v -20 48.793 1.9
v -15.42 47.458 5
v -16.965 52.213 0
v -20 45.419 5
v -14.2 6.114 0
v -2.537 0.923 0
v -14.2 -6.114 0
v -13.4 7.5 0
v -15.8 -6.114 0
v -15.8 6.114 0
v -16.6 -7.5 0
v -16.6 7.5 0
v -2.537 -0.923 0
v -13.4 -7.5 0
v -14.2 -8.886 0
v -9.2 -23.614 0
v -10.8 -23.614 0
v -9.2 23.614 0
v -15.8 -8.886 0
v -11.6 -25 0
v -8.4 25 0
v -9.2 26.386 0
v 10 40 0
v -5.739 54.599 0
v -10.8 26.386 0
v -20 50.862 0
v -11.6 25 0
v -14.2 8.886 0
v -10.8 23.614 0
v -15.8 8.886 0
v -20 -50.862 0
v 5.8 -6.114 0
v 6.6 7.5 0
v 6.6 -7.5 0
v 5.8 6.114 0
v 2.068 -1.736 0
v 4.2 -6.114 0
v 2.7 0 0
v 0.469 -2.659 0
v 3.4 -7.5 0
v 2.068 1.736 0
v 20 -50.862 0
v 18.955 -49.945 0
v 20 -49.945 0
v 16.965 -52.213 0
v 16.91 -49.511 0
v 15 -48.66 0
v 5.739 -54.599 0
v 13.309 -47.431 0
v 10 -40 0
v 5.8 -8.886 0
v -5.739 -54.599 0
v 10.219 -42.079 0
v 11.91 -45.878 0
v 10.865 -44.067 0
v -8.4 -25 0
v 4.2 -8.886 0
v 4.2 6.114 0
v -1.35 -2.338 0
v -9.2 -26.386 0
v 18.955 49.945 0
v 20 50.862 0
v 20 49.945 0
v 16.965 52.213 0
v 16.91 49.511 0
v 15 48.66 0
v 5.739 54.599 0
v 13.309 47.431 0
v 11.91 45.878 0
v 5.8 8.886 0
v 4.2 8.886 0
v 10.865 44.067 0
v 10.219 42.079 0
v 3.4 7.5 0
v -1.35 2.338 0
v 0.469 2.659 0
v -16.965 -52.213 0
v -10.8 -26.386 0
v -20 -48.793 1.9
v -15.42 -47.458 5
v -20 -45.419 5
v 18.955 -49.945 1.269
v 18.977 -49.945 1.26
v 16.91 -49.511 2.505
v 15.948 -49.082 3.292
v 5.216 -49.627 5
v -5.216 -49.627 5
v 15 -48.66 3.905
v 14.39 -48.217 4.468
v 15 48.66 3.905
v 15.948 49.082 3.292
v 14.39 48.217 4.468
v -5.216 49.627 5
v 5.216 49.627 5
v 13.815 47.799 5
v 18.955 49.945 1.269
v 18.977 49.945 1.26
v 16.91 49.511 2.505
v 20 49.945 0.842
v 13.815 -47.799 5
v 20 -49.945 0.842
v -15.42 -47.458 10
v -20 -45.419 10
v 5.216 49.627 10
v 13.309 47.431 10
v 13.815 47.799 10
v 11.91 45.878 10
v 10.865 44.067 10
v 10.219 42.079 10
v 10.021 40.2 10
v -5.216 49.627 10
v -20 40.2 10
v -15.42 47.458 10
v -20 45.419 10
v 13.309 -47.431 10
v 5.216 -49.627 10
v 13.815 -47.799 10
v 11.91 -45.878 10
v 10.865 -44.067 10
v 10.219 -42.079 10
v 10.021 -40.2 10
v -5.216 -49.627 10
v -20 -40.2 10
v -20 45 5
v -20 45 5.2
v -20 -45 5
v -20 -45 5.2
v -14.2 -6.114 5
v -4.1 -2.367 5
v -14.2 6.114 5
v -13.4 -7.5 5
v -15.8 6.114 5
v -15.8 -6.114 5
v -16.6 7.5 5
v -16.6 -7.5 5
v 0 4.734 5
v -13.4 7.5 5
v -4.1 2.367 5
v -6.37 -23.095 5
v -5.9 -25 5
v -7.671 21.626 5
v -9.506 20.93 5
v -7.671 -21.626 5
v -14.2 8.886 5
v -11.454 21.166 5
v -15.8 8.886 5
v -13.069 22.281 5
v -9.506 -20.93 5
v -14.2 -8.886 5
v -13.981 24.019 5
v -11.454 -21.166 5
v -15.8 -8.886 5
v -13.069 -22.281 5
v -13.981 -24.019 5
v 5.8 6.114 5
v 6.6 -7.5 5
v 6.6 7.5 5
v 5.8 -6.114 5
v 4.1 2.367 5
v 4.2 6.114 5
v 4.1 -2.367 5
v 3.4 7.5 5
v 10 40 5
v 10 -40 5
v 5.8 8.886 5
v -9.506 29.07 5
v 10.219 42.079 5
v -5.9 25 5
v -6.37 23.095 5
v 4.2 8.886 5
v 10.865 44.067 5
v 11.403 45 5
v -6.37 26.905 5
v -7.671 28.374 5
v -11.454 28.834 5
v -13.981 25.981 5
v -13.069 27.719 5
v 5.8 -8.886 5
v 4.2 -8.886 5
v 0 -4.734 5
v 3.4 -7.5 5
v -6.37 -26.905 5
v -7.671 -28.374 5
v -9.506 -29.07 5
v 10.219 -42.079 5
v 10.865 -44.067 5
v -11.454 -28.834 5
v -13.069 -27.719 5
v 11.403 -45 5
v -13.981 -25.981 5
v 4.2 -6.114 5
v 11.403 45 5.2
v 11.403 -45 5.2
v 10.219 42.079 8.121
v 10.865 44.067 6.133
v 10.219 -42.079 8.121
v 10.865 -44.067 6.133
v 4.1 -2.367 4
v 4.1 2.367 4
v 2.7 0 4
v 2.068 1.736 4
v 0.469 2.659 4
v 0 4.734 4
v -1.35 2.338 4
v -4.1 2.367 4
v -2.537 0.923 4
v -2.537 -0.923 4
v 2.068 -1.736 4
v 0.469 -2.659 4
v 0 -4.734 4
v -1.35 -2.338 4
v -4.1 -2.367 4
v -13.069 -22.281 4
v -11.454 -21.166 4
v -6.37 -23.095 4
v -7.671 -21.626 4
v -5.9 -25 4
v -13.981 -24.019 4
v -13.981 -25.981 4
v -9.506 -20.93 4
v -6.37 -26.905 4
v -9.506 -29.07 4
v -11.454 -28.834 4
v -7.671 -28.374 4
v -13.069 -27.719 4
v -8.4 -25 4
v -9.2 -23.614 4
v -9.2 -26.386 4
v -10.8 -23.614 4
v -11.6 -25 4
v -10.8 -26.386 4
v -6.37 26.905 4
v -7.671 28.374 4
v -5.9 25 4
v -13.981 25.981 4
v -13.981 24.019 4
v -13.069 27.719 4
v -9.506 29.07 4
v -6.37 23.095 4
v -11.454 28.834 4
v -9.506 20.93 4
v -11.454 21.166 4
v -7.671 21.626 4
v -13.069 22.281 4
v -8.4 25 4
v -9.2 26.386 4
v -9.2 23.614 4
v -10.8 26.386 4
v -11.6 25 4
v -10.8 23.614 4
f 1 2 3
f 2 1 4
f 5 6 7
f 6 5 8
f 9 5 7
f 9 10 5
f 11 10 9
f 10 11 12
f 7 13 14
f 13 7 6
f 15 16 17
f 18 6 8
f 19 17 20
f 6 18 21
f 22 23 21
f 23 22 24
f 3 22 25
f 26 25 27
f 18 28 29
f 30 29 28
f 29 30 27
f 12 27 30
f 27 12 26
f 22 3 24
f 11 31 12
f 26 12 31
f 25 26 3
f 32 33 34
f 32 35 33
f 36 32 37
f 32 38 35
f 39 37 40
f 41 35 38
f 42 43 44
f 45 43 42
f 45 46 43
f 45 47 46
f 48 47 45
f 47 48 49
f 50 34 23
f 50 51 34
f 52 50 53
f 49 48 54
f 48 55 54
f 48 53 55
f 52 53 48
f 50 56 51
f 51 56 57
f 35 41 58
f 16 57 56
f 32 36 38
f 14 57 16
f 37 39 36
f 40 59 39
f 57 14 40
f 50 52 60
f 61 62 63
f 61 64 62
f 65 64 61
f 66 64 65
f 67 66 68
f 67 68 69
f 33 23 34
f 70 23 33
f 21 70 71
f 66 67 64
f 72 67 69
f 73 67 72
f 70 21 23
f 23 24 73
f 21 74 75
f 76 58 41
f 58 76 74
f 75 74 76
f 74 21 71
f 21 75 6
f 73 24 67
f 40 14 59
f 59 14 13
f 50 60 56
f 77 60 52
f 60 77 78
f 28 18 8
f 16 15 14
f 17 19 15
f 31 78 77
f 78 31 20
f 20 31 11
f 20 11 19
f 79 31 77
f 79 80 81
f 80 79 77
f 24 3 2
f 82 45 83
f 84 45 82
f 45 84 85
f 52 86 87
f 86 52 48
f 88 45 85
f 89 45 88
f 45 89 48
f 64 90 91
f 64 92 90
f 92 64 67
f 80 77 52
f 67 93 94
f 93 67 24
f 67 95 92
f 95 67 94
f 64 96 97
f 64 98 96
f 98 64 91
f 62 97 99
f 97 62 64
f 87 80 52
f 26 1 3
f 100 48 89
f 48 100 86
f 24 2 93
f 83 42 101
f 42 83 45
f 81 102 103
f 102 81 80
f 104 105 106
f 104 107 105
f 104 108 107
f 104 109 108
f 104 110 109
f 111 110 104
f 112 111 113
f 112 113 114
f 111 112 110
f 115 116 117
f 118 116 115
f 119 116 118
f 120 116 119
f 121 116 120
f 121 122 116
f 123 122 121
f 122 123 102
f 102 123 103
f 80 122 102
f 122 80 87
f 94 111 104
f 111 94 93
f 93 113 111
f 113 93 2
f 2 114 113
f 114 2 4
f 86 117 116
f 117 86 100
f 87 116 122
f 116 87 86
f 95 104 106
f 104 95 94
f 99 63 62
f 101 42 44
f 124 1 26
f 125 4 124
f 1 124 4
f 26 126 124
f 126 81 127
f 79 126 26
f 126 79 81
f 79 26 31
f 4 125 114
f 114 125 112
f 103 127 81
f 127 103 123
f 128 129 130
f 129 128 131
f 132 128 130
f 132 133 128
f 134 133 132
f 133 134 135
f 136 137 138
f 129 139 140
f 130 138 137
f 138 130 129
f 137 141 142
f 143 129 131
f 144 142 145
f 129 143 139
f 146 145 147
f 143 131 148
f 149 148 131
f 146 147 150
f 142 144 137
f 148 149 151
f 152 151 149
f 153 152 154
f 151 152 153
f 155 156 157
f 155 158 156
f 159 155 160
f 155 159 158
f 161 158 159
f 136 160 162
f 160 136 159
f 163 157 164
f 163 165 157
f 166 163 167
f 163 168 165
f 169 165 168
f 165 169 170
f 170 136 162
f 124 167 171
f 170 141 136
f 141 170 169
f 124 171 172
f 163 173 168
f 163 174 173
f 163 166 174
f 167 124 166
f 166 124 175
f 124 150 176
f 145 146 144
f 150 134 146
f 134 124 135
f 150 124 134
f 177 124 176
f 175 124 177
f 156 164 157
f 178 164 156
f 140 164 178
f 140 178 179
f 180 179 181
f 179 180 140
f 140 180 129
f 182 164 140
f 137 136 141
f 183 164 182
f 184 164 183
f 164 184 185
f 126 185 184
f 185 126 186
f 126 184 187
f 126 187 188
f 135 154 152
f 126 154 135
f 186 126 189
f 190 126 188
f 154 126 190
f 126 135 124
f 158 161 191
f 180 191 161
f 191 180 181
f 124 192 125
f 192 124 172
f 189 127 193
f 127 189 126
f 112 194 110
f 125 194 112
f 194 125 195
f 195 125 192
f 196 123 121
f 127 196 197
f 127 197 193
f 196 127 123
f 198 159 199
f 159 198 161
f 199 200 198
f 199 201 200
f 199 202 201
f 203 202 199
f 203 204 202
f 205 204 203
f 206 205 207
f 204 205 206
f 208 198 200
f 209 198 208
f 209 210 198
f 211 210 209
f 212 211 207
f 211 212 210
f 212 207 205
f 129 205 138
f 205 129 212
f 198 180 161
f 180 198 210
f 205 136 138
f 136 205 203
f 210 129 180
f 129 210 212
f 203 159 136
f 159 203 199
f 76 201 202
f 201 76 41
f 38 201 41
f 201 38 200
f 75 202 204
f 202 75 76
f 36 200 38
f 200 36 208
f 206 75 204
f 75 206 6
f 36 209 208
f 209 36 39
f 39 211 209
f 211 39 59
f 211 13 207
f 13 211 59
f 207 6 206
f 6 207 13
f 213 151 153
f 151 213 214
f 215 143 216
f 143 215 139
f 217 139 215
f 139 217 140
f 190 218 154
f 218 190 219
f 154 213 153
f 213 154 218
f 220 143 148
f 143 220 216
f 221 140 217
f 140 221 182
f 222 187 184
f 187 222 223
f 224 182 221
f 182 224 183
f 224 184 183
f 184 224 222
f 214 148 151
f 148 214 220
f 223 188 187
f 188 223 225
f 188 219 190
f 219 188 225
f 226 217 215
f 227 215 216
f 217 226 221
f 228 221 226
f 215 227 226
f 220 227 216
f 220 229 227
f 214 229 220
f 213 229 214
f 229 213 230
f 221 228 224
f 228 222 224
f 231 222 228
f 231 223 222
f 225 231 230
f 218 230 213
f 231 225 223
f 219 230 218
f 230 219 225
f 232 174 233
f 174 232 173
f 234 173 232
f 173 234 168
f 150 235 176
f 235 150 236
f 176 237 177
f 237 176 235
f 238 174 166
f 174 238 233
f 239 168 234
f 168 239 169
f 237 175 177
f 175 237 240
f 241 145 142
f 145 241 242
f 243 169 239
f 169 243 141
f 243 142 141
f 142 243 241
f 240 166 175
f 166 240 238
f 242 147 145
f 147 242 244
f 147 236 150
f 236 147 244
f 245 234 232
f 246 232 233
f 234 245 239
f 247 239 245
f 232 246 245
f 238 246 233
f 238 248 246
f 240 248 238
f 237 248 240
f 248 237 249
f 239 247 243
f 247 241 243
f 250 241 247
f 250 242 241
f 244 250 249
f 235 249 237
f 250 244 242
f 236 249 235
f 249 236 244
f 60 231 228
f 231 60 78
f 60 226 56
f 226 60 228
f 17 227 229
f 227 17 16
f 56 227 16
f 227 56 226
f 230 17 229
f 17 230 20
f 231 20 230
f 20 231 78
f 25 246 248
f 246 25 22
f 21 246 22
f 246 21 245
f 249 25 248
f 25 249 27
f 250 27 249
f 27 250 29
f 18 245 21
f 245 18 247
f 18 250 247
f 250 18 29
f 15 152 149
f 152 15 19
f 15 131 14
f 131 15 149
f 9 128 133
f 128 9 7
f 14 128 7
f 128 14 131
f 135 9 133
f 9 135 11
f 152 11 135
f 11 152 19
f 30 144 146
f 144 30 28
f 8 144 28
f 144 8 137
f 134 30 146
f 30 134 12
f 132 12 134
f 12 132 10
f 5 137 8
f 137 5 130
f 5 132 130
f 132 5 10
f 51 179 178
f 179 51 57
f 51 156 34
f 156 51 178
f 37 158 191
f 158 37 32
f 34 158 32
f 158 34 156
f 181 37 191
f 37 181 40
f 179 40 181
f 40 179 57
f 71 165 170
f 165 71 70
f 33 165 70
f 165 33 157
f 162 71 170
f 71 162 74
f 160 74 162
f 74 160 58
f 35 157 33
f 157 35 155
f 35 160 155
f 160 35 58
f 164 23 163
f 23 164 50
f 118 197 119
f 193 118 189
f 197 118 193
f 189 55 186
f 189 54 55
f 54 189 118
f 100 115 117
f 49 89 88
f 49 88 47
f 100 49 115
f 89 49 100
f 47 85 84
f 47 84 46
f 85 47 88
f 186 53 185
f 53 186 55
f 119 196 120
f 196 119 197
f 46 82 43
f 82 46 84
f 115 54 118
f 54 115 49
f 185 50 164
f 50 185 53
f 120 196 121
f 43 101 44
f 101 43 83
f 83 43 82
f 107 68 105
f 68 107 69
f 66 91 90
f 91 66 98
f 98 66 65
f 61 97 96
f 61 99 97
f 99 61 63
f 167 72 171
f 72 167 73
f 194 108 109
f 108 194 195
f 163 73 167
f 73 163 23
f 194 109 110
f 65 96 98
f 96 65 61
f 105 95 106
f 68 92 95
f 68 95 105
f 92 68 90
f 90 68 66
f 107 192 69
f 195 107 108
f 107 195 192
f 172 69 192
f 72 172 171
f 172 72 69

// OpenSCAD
// file: config_4x5.scad
/*
This is the base configuration file for the 4x5" format
# we are not using the exact ANSI measures, but slightly rounded measures for slight simplification
*/
vStabilizerTotal_h = 7;

// general tolerance
vTolerance = 0.2;

// sheet film and cassette measurements (roughly based on the ANSI measurements)
vFilmSheet_l = 127;
vFilmSheet_w = 102;
vCassette_l = 160; // A min
vCassette_w = 121; // B max
vCassette_h = 13.2; // C max
vLightTrap_l = 2; // M2
vLightTrap_w = vCassette_w;
vLightTrap_h = 1.5; // M1
vLightTrap_offsetX = 141; // G max
vFilmWindow_l = 121;
vFilmWindow_w = 101;
vFilmWindow_offsetX = 16;
vGroundGlass_offsetZ = 5;

// Graflok
vGraflok_h = 6; // this is not the official measurement, just measured from a camera 

// lens board measures (we are using Wista/Technika-style lensboards)
vLensboard_l = 100;
vLensboard_w = 97;
vLensboard_h = 2;
vLensboard_offsetX = -(vLensboard_l+3)/2; // caution: we have an asymetric offset!
vLensboard_offsetY = -vLensboard_w/2;
vLensboardHole_d = 85;
vLensboardLighttrap_d = 89;
vLensboardLighttrap_h = 1+vTolerance;

// bellows frame measures - the bellows frame design is derived from standardcameras.com
// back frame
vBellowsBackInner_l = 144; //???? check and replace with the measurement from your bellows!
vBellowsBackInner_w = vBellowsBackInner_l;
vBellowsBackOuter_l = vBellowsBackInner_l+1;
vBellowsBackOuter_w = vBellowsBackOuter_l;

vBellowsBackFrameOuter_l = 159;
vBellowsBackFrameOuter_w = vBellowsBackFrameOuter_l;
vBellowsBackFrameOuter_h = 7;
vBellowsBackFrameInner_l = 135;
vBellowsBackFrameInner_w = vBellowsBackFrameInner_l;
vBellowsBackFrameInner_h = 5;

vBellowsBackLightTrapOuter_l = vBellowsBackFrameInner_l+2*2;
vBellowsBackLightTrapOuter_w = vBellowsBackLightTrapOuter_l;
vBellowsBackLightTrap_h = 3;

//vBellowsBackFrameScrewHole_d = 2;
//vBellowsBackFrameScrewHole_h = 10;
vBellowsBackFrameScrewHole_offsetXY = 70;
vBellowsBackFrameScrewHole_offsetZ = vBellowsBackFrameOuter_h/2;

// front frame
vBellowsFrontInner_l = 94; //???? check and replace with the measurement from your bellows!
vBellowsFrontInner_w = vBellowsFrontInner_l;
vBellowsFrontOuter_l = vBellowsFrontInner_l+1;
vBellowsFrontOuter_w = vBellowsFrontOuter_l;

vBellowsFrontFrameOuter_l = 104;
vBellowsFrontFrameOuter_w = vBellowsFrontFrameOuter_l;
vBellowsFrontFrameOuter_h = 7;
vBellowsFrontFrameInner_l = 82;
vBellowsFrontFrameInner_w = vBellowsFrontFrameInner_l;
vBellowsFrontFrameInner_h = 5;

vBellowsFrontLightTrapOuter_l = vBellowsFrontFrameInner_l+2*2;
vBellowsFrontLightTrapOuter_w = vBellowsFrontLightTrapOuter_l;
vBellowsFrontLightTrap_h = 0;

//vBellowsFrontFrameScrewHole_d = 2;
//vBellowsFrontFrameScrewHole_h = 10;
vBellowsFrontFrameScrewHole_offsetXY = 40;
vBellowsFrontFrameScrewHole_offsetZ = vBellowsFrontFrameOuter_h/2;

// body dimensions
vWall_strength = 5;
vBodyOuter_l = 185; // make sure this is at least 4*vWall_strength larger than vBellowsBackFrameOuter_l!
vBodyOuter_w = 170; // make sure this is at least 2*vWall_strength larger than vBellowsBackFrameOuter_l!
vBodyOuter_h = 65;
vBodyEdge_r = vWall_strength;

// we will center our model on the Y axis and on the center of the bellows frame
// at least for the 4x5 version, we have to do an asymetric offset of 2.5mm on the X-axis 
vAsymOffsetX = -2.5;  

// back plate
vBackPlateLength = 160; // we will probably use about the same size as the bellows back frame
vBackPlateStrength = vWall_strength;

// hinges for front lid
vHingeInnerDistance = 100;
vHingeBaseWidth = 20;
vHingeHole = 4;

// lid lock measures
vLidLockBase_d = 8;
vLidLockHole_distance = 70;

// rail dimensions
vLowerRail_w = 90;
vUpperRail_w = vLowerRail_w;

// cutout for stop indents
vStopIndent_l = 4;
vStopIndent_h = 5;
vStopIndentDistance = 25; // shorter than 25 is not necessary
vStopIndent_offsetX = 20; // don't go shorter than 20 if you intend to use a 90mm lens!

// for all dovetails we use a base width of 5mm and a base height of 5mm
// we are applying tolerances to the inner AND outer part of a dovetail, in width and height
vDoveTail_w = 5;
vDoveTail_h = 5;
vDoveTail_tolerance = 0.2;

// front standard carrier / slider
// width is depending on vUpperRail_w
vSliderBase_w = vUpperRail_w + (4*vDoveTail_w);
vSliderBase_l = 40; // make sure to have enough space in the body.


// lever plate 
vLeverPlateBase_w = vUpperRail_w - (8*vDoveTail_w);
vLeverPlateBlock_w = 25;
vLeverPlateBlock_l = vSliderBase_l-(2*vDoveTail_w);

vFrontStandard_h = 130;
vFrontStandardSlot_h = vFrontStandard_h - 30;

// lensboard carrier
vFrontPlate_length = vSliderBase_w+6; // vSliderBase_w is a bit too tight for 4x5", so there we will add 5mm, for 5x7 vSliderBase_w is OK to get a squared lensboard carrier
vFrontPlate_width = vSliderBase_w; //vFrontPlate_length;
vFrontPlate_height = 16;
vEdgeCutCylinder = floor(sqrt(2*pow(vFrontPlate_width,2)))-5;

vTiltDovetailBase_d1 = 30;
vTiltDovetailBase_d2 = vTiltDovetailBase_d1+(2*vDoveTail_w);
vTiltDovetailBaseBlock_d = vTiltDovetailBase_d1+(4*vDoveTail_w);

vTiltDovetail_d1 = vTiltDovetailBase_d1-vTolerance;
vTiltDovetail_d2 = vTiltDovetailBase_d2-vTolerance;
vTiltDovetail_h = vDoveTail_w-vTolerance;

vTiltDovetailCutout_d1 = vTiltDovetailBase_d2+vTolerance;
vTiltDovetailCutout_d2 = vTiltDovetailBase_d1+vTolerance;

vAxisHole_d = 10+vTolerance;
vAxisHole_h = vDoveTail_w+vTolerance;

vTiltLockBolt_d = 12;
vTiltLockBolt_h = 14;
//vTiltLockBoltHole_d = 8;
//vTiltLockBoltHole_h = vTiltLockBolt_h;

vTiltHeight = 50;
vTiltRadius = vFrontPlate_length/2;
vTiltAngleMinus = -7;
vTiltAnglePlus = 7;
vTiltAxis_d = 10-vTolerance;

// focusing rod
vFocusingRod_d = 6;
vFocusingKnob_d = 25;
vFocusingKnob_h = 20;

// stabilizer measures (just the outer measures of our stabilizer block, not the tripod slider)
vStabilizerBase_l = 135;
vStabilizerBase_w = 90;  
vStabilizerBase_h = 7;
vStabilizerDovetailBase_w = 50;
// screw holes for the stabilizer
vLidHoleCount_x = 4;
vLidHoleDist_x = 35;
vLidHoleCount_y = 2;
vLidHoleDist_y = 60;


// screw diameters, length is individually set
vScrew1Hole_d = 3;
vScrew1ThreadHole_d = 2.2;
vScrew2Hole_d = 2;
vScrew2ThreadHole_d = 1.4;


// Dimensions for small heat set insert holes.
// Sized for M2 inserts, 3 mm depth, 3.5 mm max OD
// (may be labelled M2x3.5x3)
vInsertM2Hole_d = 3.2;
vInsertM2MinDepth_h = 4.0;
vInsertM2Size_d = 3.5;
vInsertM2Depth_h = 3.0;

// Dimensions for heat set insert holes.
// Sized for "Voron standard" M3 inserts, 4 mm depth, 5 mm max OD
// (variously labelled M3x4x5 or M3x5x4)
vInsertM3Hole_d = 4.7;
vInsertM3MinDepth_h = 5.0;
vInsertM3Size_d = 5.0;
vInsertM3Depth_h = 4.0;

// Dimensions for large heat set insert holes.
// Sized for M5 inserts, 5 mm depth, 7 mm max OD
// (may be labelled M5x7x5)
vInsertM5Hole_d = 6.7;
vInsertM5MinDepth_h = 6.0;
vInsertM5Size_d = 7.0;
vInsertM5Depth_h = 5.0;
// file: modules.scad
/*
This is a collection of the modules which are used heavily within the whole project.
Almost all parts rely on the modules to remain "as is", especially regarding their current orientation.
So please act very carefully here, otherwise you may screw up the complete design!

*/
include <baseconfig.scad>;


// roof module - this is heavily used for dovetail cutouts
// please keep as is
module roof(l, w, h){
    polyhedron(
        points=[
            [0,0,0],
            [l,0,0],
            [l,w,0],
            [0,w,0],
            [0,w/2,h],
            [l,w/2,h]
            ],
        faces=[
            [0,1,2,3],
            [0,4,1],
            [1,4,5,2],
            [2,5,3],
            [3,5,4,0]
            ]
            );
    };

// a wedge module - this is heavily used for cutting edges
// please keep as is    
module wedge(l, w, h) {
    polyhedron(
            points=[
                [0,0,0],
                [l,0,0],
                [l,w,0],
                [0,w,0],
                [0,0,h],
                [l,0,h]
            ],
            faces=[
                [0,3,2,1],
                [0,1,5,4],
                [1,2,5],
                [2,3,4,5],
                [3,0,4]
            ]
    );
   };

// simple tube module.   
module tube(d1, d2, h) {
    difference() {
        cylinder(d=d1, h=h);
        cylinder(d=d2, h=h);
        };
    };

// mainly used for making holes for countersunk screws
// please keep as is    
module countersunk_screw(vScrew_d, vScrew_l){
    union(){
    cylinder(d=vScrew_d, h=vScrew_l);
    cylinder(d1=vScrew_d*2, d2=0, h=vScrew_d);
    };
};

// module for making hexagons, e.g. hex nuts. kw is the key width
// please keep as is
module hex(kw, h) {
	render()
        translate([0, 0, h/2])
            intersection_for(a = [0, 120, 240]) {
                rotate([0, 0, a])
                    cube([kw, 3 * kw, h], true);
                }
}


// Heatset insert
// d: Thread diameter
// od: Outer diameter
// l: Total length
module insert(d, od, l)
{
    echo(Insert = d, od, l);
    difference() {
        cylinder(l, d=od, $fn=15);
        translate([0, 0, -0.5]) cylinder(l+1, d=d, $fn=15);
        };
}

module insert_m2()
{
    color("gold") insert(2, vInsertM2Size_d, vInsertM2Depth_h);
}

module insert_m3()
{
    color("gold") insert(3, vInsertM3Size_d, vInsertM3Depth_h);
}

module insert_m5()
{
    color("gold") insert(5, vInsertM5Size_d, vInsertM5Depth_h);
}

// Countersunk screw, metric, for display
// Example: https://www.aliexpress.com/item/1005007838338973.html
module screw_cs(l, d=3, dk=6, s=2, t=1) {
    // l: total length (including head) in mm
    // d: thread diameter (eg 3 for M3)
    // dk: max head diameter
    // s: hex socket flat-to-flat size
    // t: hex socket depth
    echo(CountersunkScrew = d, l);
    difference() {
        union() {
            cylinder(h=l, r=d/2, $fn=15);
            cylinder(h=(dk-d)/2, r1=dk/2, r2=d/2, $fn=15);
            }
        cylinder(h=t, r=s/2*2/sqrt(3), $fn=6);
    }
}

module screw_m3_cs(l) {
    color("silver") screw_cs(l, d=3, dk=6, s=2, t=1);
}

module screw_m2_cs(l) {
    color("silver") screw_cs(l, d=2, dk=3.8, s=1.5, t=0.75);
}
module screw_m5_cs(l) {
    color("silver") screw_cs(l, d=5, dk=9.5, s=3, t=1.6);
}

// Button head screw, metric, for display
// Example: https://www.aliexpress.com/item/32967225441.html
module screw_bh(l, d=3, k=1.5, dk=5.5, s=2, t=1) {
    // l: shaft length (NOT including head) in mm
    // d: thread diameter (eg 3 for M3)
    // k: head depth
    // dk: head max diameter
    // s: hex socket flat-to-flat size
    // t: hex socket depth
    echo(ButtonheadScrew = d, l);
    difference() {
        union() {
            translate([0, 0, k]) cylinder(h=l, r=d/2, $fn=15);
            difference() {
                translate([0, 0, k]) intersection() {
                    sphere(d=dk, $fn=15);
                    translate([-dk/2, -dk/2, -dk]) cube(dk);
                }
                translate([-dk/2, -dk/2, -dk]) cube(dk);
            }
        }
        cylinder(h=t, r=s/2*2/sqrt(3), $fn=6);
    }
}

module screw_m2_bh(l) {
    color("silver") screw_bh(l, d=2, dk=3.4, s=1.175, t=0.6);
}

module screw_m3_bh(l) {
    color("silver") screw_bh(l, d=3, dk=5.7, s=2, t=1);
}


module nut_m5() {
    echo(Nut = 5);
    difference() {
        rotate([0, 0, 30]) cylinder(h=3.9, d=8*2/sqrt(3), $fn=6);
        cylinder(h=5, d=5, $fn=15);
        }
    }
    
    
module thumbscrew(bolt_d, bolt_dk, screw_d, screw_h, n_knurls, knurl_d, knurl_f) {
    // bolt_d:  central bolt diameter
    // bolt_dk: bolt head max diameter
    // screw_d: thumbscrew outer diameter
    // screw_h: thumbscrew height
    // n_knurls: number of knurls
    
    min_knurl_offset = screw_d/2 - knurl_d;
    max_knurl_offset = screw_d/2 + knurl_d;
    knurl_offset = min_knurl_offset + knurl_f*(max_knurl_offset - min_knurl_offset);
    
    difference()
    {
        union()
        {
            translate([0, 0, 1]) cylinder(screw_h-2, d=screw_d);
            cylinder(1, d1=screw_d-1, d2=screw_d);
            translate([0, 0, screw_h-1]) cylinder(1, d1=screw_d, d2=screw_d-1);
        }
        cylinder(screw_h, d=bolt_d);
        cylinder(bolt_dk/2, d1=bolt_dk, d2=0);
        for (i = [1:n_knurls])
        {
            rotate([0, 0, i*360/(n_knurls)]) translate([knurl_offset, 0, 0]) cylinder(screw_h, d=knurl_d);
        }
    }
}

module thumbscrew_m5(screw_d, screw_h, n_knurls, knurl_d, knurl_f) {
    thumbscrew(5, 9.5, screw_d, screw_h, n_knurls, knurl_d, knurl_f);
}


module t6_flange_coupler() {
    // T6 flange coupler
    // Example: https://www.aliexpress.com/item/1005008049363389.html
    echo(FlangeCoupler = 6);
    difference() {
        union() {
            translate([0, 0, 2]) cylinder(h=10, d=10);
            cylinder(h=2, d=22);
        }
        cylinder(h=12, d=6);
        translate([0, 15, 7]) rotate([90, 0, 0]) cylinder(h=30, d=3);
        for (i = [0:3]) {
            rotate([0, 0, 45+90*i]) translate([-8, 0, 0]) cylinder(h=2, d=3);
        }
    }
}


module AXK0619_thrust_bearing() {
    echo(ThrustBearing = "AXK0619");
    difference() {
        cylinder(h=4, d=19);
        cylinder(h=4, d=6);
    }
}


module t6_lead_screw(l) {
    echo(LeadScrewT6 = l);
    color("silver") cylinder(h=l, d=6);
}

module t6_lead_screw_nut() {
    echo("LeadScrewT6Nut");
    intersection()
    {
        difference() {
            union() {
                cylinder(h=15, d=12);
                translate([0, 0, 1.5]) cylinder(h=3.5, d=24);
            }
            cylinder(h=15, d=6);
        }  
        translate([-50, -12.5/2, -50]) cube([100, 12.5, 100]);
    }
}

module threaded_rod_m5(l) {
    echo(ThreadedRodM5 = l);
    color("silver") cylinder(h=l, d=5);
}

module smooth_rod_m4(l) {
    echo(SmoothRodM4 = l);
    color("silver") cylinder(h=l, d=4);
}


module screw_m3_grub(l) {
    echo(GrubScrew = 3, l);
    color("silver") cylinder(h=l, d=3, $fn=15);
}


module screw_m5_grub(l) {
    echo(GrubScrew = 5, l);
    color("silver") cylinder(h=l, d=5, $fn=15);
}


module washer_m6() {
    // M6x12x0.8 washer
    echo(Washer = 6, 0.8);
    difference() {
        cylinder(h=0.8, d=12);
        cylinder(h=0.8, d=6.6);
    }
}


module springwasher_m6() {
    // M6x12x1.5 washer (compresses to 0.5)
    // Show as compressed (~0.5 mm height)
    echo(SpringWasher = 6);
    difference() {
        cylinder(h=0.5, d=12);
        cylinder(h=0.6, d=6);
    }
}
// file: baseconfig.scad
/*
Here we define some variables which are independent from the camera format
*/


// some generic variables

// we are including a format specific configuration sheet - but make sure to include only one!

include <config_4x5.scad>;
// include <config_5x7.scad>;
// include <config_8x10.scad>;

// Arca Swiss tripod plate
// caution: some Arca Swiss compatible tripod heads may have slight variations
// vArca_length = xx; // the length is irrelevant here
vArca_width = 38;
vArca_height = 7;
vArcaBase_cutout = 4;
vArcaBase_height = 1.5;
// main file
// loading the base configuration
include <baseconfig.scad>;

// some modules such as hex, countersunk screws, roof, wedge are available in a module file
use <modules.scad>;

module slider() {

// we have some large rounded objects, so we smooth them a bit more with a higher number of fragments
//$fn = 120; 

// base plate
vFrontStandartBasePlate_d1 = vSliderBase_w-vTolerance; // maybe subtract tolerance here?
vFrontStandartBasePlate_d2 = vFrontStandartBasePlate_d1-(2*vDoveTail_w);
vFrontStandartBasePlate_l = vSliderBase_l; // we are intersecting our cylinder with a cube!
vFrontStandartBasePlate_w = vFrontStandartBasePlate_d1;
vFrontStandartBasePlate_h1 = vDoveTail_h;
vFrontStandartBasePlate_h2 = vDoveTail_h;
vFrontStandartBasePlate_h = vFrontStandartBasePlate_h1+vFrontStandartBasePlate_h2;
vFrontStandartBasePlate_offsetX = 0;
vFrontStandartBasePlate_offsetY = 0;
vFrontStandartBasePlate_offsetZ = 0;

vLowerDovetail_l = vFrontStandartBasePlate_l;
vLowerDovetail_outerwidth = vFrontStandartBasePlate_w-(4*vDoveTail_w)+vTolerance;
vLowerDovetail_innerwidth = vLowerDovetail_outerwidth-(2*vDoveTail_w);
vLowerDovetail_offsetX = -vLowerDovetail_outerwidth/2;
vLowerDovetail_offsetY = -vLowerDovetail_l/2;
vLowerDovetail_offsetZ = vDoveTail_h;

vCentralScrewHole_d = 5+(2*vTolerance);
vCentralScrewHole_h = vFrontStandartBasePlate_h;
vCentralScrewHole_offsetX = 0;
vCentralScrewHole_offsetY = 0;
vCentralScrewHole_offsetZ = 0;

vCentralScrewHexNut_keywidth = 8+vTolerance;
vCentralScrewHexNut_height = 6;
vCentralScrewHexNut_offsetX = 0;
vCentralScrewHexNut_offsetY = 0;
vCentralScrewHexNut_offsetZ = vFrontStandartBasePlate_h-vCentralScrewHexNut_height;

vLeverBoltHole_d = 8+vTolerance;
vLeverBoltHole_h = vFrontStandartBasePlate_h;
vLeverBoltHole_offsetX = -(2*vDoveTail_w);
vLeverBoltHole_offsetY = (vUpperRail_w-(8*vDoveTail_w)) / 2;
vLeverBoltHole_offsetZ = vFrontStandartBasePlate_h1-1;

vLeverBoltScrewHole_d = vInsertM2Hole_d;
vLeverBoltScrewHole_h = vFrontStandartBasePlate_h;
vLeverBoltScrewHole_offsetX = vLeverBoltHole_offsetX;
vLeverBoltScrewHole_offsetY = vLeverBoltHole_offsetY;
vLeverBoltScrewHole_offsetZ = 0;

// lever plate screw holes
vLeverPlateScrewHole_d = vInsertM2Hole_d;
vLeverPlateScrewHole_h = vFrontStandartBasePlate_h;
vLeverPlateScrewHole_offsetX1 = -(3*vDoveTail_w);
vLeverPlateScrewHole_offsetX2 = vDoveTail_w;
vLeverPlateScrewHole_offsetY = (vLeverPlateBlock_w/2)-vDoveTail_w;
vLeverPlateScrewHole_offsetZ = 0;

vLeverCutout_l = 2*vDoveTail_w;
vLeverCutout_w = vUpperRail_w-(2*vDoveTail_w);
vLeverCutout_h = vFrontStandartBasePlate_h;
vLeverCutout_offsetX = (vFrontStandartBasePlate_l/2)-vLeverCutout_l;
vLeverCutout_offsetY = -vLeverCutout_w/2;
vLeverCutout_offsetZ = 0;

vLeverCutoutHoles_d = 2*vLeverCutout_l;
vLeverCutoutHoles_h = vLeverCutout_h;
vLeverCutoutHoles_offsetX = vLeverCutout_offsetX+(vLeverCutoutHoles_d/2);
vLeverCutoutHoles_offsetY = vLeverCutout_offsetY;
vLeverCutoutHoles_offsetZ = 0;


difference(){
union(){
    difference(){
        // front standart base plate
        intersection(){
            union(){
                cylinder(d1=vFrontStandartBasePlate_d1, d2=vFrontStandartBasePlate_d2, h=vFrontStandartBasePlate_h1);
                cylinder(d=vFrontStandartBasePlate_d2, h=vFrontStandartBasePlate_h);
            };
            translate([-vFrontStandartBasePlate_l/2, -vFrontStandartBasePlate_w/2, 0])
                cube([vFrontStandartBasePlate_l, vFrontStandartBasePlate_w, vFrontStandartBasePlate_h]);    
        };    

        
        // cutout for lower dovetail
        translate([0, 0, vFrontStandartBasePlate_h1])
        /*
        union(){
            translate([-vLowerDovetail_l/2, -vLowerDovetail_outerwidth/2, 0])
                cube([vLowerDovetail_l, vLowerDovetail_outerwidth, vTolerance]);
            translate([-vLowerDovetail_l/2, -vLowerDovetail_innerwidth/2, vTolerance])
                cube([vLowerDovetail_l, vLowerDovetail_innerwidth, vDoveTail_h]);
            translate([vLowerDovetail_l/2, -vLowerDovetail_outerwidth/2, vTolerance])
                rotate([0, 0, 90])
                    roof(2*vDoveTail_w, vLowerDovetail_l, vDoveTail_h);
            translate([-vLowerDovetail_l/2, vLowerDovetail_outerwidth/2, vTolerance])
                rotate([0, 0, 270])
                    roof(2*vDoveTail_w, vLowerDovetail_l, vDoveTail_h);
        };
        */
        union(){
            translate([-vLowerDovetail_l/2, -vLowerDovetail_outerwidth/2, 0])
                cube([vLowerDovetail_l, vLowerDovetail_outerwidth, vTolerance]);
            translate([-vLowerDovetail_l/2, -vLowerDovetail_outerwidth/2, vTolerance])
                roof(vLowerDovetail_l, vLowerDovetail_outerwidth, vLowerDovetail_outerwidth/2);
            
            }
        
        
        
    };
    
    };
    


    // central screw hole
    translate([vCentralScrewHole_offsetX, vCentralScrewHole_offsetY, vCentralScrewHole_offsetZ])
        cylinder(d=vCentralScrewHole_d, h=vCentralScrewHole_h);
    
    translate([vCentralScrewHexNut_offsetX, vCentralScrewHexNut_offsetY, vCentralScrewHexNut_offsetZ])
        hex(vCentralScrewHexNut_keywidth, vCentralScrewHexNut_height);
    
    // holes for lever bolts
    // outer
    translate([vLeverBoltHole_offsetX, -vLeverBoltHole_offsetY, vLeverBoltHole_offsetZ])
        cylinder(d=vLeverBoltHole_d, h=vLeverBoltHole_h);
    translate([vLeverBoltHole_offsetX, +vLeverBoltHole_offsetY, vLeverBoltHole_offsetZ])
        cylinder(d=vLeverBoltHole_d, h=vLeverBoltHole_h);
    
    // lever bolt screw holes
    translate([vLeverBoltScrewHole_offsetX, -vLeverBoltScrewHole_offsetY, vLeverBoltScrewHole_offsetZ])
        cylinder(d=vLeverBoltScrewHole_d, h=vLeverBoltScrewHole_h);
    translate([vLeverBoltScrewHole_offsetX, +vLeverBoltScrewHole_offsetY, vLeverBoltScrewHole_offsetZ])
        cylinder(d=vLeverBoltScrewHole_d, h=vLeverBoltScrewHole_h);
    
    // lever plate screw holes
    translate([vLeverPlateScrewHole_offsetX1, -vLeverPlateScrewHole_offsetY, vLeverPlateScrewHole_offsetZ])
        cylinder(d=vLeverPlateScrewHole_d, h=vLeverPlateScrewHole_h);
    translate([vLeverPlateScrewHole_offsetX1, +vLeverPlateScrewHole_offsetY, vLeverPlateScrewHole_offsetZ])
        cylinder(d=vLeverPlateScrewHole_d, h=vLeverPlateScrewHole_h);
    translate([vLeverPlateScrewHole_offsetX2, -vLeverPlateScrewHole_offsetY, vLeverPlateScrewHole_offsetZ])
        cylinder(d=vLeverPlateScrewHole_d, h=vLeverPlateScrewHole_h);
    translate([vLeverPlateScrewHole_offsetX2, +vLeverPlateScrewHole_offsetY, vLeverPlateScrewHole_offsetZ])
        cylinder(d=vLeverPlateScrewHole_d, h=vLeverPlateScrewHole_h);
    
     
    // cutout for locking levers
    translate([vLeverCutout_offsetX, vLeverCutout_offsetY, vLeverCutout_offsetZ])
        cube([vLeverCutout_l, vLeverCutout_w, vLeverCutout_h]);
    translate([vLeverCutoutHoles_offsetX, vLeverCutoutHoles_offsetY, vLeverCutoutHoles_offsetZ])    
        cylinder(d=vLeverCutoutHoles_d, h=vLeverCutoutHoles_d );
    translate([vLeverCutoutHoles_offsetX, -vLeverCutoutHoles_offsetY, vLeverCutoutHoles_offsetZ])    
        cylinder(d=vLeverCutoutHoles_d, h=vLeverCutoutHoles_d );
    
};

};

slider();
